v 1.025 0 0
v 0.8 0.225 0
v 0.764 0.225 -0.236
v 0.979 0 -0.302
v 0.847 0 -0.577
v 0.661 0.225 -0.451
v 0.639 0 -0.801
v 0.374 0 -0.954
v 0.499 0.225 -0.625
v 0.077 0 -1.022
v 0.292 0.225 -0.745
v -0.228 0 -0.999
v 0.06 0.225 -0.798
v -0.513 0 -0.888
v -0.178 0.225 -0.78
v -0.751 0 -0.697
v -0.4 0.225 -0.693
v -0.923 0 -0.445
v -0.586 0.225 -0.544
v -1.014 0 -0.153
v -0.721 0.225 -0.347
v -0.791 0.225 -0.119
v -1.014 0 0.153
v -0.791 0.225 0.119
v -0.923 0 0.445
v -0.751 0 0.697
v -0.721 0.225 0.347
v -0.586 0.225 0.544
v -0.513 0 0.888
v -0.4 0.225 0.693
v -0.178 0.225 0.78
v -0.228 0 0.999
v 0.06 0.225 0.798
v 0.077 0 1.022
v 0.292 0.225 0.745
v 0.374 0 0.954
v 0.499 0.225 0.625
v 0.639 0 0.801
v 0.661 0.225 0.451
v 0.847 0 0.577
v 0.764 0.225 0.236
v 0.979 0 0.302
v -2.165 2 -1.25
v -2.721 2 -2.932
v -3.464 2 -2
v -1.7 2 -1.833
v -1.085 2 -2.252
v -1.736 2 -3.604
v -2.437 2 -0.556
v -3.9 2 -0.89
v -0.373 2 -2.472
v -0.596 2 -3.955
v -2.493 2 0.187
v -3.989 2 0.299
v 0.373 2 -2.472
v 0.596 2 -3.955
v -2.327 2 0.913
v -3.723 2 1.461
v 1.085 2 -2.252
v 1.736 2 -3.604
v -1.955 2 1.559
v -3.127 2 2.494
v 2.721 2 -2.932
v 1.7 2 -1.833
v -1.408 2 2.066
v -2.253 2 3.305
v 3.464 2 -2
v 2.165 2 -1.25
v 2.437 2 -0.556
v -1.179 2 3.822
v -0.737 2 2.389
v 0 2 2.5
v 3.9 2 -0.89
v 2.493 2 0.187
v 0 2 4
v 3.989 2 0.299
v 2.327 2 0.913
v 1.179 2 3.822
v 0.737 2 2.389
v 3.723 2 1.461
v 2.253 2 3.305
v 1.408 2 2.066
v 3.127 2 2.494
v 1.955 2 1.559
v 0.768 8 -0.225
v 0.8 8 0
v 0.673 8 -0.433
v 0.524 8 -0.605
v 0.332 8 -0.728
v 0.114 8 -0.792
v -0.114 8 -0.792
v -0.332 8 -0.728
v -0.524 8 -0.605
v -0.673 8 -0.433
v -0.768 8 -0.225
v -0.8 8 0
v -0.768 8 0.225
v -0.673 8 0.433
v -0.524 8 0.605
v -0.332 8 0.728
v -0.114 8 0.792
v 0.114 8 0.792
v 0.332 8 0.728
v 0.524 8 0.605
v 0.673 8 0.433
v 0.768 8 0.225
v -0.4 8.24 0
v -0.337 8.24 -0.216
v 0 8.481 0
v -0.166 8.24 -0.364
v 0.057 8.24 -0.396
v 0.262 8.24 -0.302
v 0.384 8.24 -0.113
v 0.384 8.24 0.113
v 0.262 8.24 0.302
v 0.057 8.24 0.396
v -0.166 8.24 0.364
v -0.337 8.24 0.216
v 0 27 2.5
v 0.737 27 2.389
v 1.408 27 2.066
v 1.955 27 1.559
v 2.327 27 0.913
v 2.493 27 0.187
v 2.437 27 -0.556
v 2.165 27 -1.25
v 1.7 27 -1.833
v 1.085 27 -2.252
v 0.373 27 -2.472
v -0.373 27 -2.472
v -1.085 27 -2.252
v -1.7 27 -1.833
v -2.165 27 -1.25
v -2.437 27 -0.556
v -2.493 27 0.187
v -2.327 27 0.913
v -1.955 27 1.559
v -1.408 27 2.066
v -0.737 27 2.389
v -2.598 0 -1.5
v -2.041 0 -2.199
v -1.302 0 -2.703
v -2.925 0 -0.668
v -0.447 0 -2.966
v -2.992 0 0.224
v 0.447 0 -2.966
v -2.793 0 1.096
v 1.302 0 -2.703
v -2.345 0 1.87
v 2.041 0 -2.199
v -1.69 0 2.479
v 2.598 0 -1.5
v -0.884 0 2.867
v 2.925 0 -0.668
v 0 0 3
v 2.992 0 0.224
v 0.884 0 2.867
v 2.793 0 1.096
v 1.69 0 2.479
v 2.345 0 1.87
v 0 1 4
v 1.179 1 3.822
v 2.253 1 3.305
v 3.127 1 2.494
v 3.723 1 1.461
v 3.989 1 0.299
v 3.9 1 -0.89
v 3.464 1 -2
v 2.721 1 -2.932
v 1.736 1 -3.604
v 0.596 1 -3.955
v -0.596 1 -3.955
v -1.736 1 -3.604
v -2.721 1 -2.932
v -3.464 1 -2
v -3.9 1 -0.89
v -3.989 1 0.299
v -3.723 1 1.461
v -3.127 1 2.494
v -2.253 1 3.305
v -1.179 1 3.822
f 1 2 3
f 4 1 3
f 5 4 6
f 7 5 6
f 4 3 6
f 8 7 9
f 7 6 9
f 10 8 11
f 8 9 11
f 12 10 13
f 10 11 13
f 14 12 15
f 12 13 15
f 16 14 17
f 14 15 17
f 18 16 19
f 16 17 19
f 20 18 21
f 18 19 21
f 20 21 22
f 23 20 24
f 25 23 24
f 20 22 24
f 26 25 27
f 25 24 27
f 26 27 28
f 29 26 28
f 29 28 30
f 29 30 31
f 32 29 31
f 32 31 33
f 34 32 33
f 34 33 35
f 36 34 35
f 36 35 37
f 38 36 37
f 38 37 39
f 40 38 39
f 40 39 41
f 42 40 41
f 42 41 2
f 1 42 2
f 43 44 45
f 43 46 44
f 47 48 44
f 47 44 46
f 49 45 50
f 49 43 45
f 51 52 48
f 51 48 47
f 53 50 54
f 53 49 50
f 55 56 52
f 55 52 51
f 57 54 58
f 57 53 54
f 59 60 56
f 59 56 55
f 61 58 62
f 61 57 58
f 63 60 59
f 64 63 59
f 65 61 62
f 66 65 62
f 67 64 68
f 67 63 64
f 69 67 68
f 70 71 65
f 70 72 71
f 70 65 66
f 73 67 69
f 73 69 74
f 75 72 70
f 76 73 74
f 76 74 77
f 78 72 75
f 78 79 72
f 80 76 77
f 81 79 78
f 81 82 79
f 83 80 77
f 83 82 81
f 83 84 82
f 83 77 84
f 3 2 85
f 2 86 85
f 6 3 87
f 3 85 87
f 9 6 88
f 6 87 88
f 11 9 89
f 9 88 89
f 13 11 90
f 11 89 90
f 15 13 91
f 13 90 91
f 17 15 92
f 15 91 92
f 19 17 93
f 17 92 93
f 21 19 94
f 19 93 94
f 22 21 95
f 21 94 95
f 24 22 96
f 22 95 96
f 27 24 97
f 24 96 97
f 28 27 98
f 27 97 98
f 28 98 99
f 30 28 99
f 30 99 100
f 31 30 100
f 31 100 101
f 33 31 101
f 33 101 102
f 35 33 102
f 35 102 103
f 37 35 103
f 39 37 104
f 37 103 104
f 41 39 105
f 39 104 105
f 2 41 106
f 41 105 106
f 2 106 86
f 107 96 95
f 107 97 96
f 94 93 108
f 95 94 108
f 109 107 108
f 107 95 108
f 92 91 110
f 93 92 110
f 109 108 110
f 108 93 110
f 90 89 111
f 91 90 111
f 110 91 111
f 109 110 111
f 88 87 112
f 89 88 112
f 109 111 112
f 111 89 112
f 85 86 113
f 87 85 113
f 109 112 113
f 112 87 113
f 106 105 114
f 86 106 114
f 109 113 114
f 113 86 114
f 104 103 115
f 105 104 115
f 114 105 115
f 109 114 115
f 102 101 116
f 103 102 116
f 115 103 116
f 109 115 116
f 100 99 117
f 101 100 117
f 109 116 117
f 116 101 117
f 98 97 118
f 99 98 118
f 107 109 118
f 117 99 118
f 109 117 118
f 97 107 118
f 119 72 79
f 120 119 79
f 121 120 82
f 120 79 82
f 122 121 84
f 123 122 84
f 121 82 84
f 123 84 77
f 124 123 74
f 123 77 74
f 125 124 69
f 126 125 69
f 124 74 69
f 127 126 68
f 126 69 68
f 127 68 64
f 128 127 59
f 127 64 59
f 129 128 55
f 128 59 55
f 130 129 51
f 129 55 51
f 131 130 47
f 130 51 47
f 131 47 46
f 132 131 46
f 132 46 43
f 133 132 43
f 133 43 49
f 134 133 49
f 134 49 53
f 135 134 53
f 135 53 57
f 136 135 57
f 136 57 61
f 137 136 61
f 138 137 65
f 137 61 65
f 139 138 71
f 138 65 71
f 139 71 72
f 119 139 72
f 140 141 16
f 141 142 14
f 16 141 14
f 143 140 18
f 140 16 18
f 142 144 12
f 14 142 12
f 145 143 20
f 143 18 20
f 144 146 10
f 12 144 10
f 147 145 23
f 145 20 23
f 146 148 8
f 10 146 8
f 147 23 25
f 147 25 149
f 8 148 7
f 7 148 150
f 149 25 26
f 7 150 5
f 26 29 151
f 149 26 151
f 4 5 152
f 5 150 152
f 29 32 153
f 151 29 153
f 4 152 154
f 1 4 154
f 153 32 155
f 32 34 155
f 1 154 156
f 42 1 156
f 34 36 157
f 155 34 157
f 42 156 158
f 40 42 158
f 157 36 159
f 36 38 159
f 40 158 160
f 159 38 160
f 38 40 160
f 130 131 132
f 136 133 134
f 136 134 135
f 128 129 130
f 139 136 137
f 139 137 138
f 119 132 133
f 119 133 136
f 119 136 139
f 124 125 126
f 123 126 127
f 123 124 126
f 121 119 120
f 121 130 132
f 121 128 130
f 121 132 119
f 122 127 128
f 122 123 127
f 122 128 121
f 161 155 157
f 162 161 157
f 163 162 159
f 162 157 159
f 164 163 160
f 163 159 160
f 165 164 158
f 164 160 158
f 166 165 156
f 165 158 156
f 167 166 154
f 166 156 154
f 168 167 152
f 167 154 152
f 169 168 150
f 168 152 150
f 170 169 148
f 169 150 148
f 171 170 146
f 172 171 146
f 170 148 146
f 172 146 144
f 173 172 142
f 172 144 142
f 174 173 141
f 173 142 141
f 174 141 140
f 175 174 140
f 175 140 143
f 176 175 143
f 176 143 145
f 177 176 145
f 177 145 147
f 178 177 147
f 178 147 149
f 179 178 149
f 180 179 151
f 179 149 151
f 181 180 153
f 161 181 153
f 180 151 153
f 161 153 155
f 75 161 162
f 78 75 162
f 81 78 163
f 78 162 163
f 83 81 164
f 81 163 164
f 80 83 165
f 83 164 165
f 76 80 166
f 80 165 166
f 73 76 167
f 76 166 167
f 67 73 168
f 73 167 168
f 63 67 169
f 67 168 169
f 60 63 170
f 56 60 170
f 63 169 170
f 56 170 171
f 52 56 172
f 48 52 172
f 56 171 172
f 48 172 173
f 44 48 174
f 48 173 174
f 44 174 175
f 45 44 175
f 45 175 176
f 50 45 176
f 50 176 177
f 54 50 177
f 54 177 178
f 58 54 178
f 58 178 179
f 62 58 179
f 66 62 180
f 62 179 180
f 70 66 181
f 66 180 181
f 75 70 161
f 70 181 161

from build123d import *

# Parameters (mm, degrees)
SKETCH1_R                   = 4
BOSS_EXTRUDE1_DEPTH         = 2
SKETCH2_R                   = 2.5
BOSS_EXTRUDE2_DEPTH         = 25
M2_TAPPED_HOLE1_D           = 1.6
M2_TAPPED_HOLE1_DEPTH       = 8
M2_TAPPED_HOLE1_CSINK_D     = 2.05
M2_TAPPED_HOLE1_CSINK_ANGLE = 90
M2_TAPPED_HOLE1_TIP         = 0.480688495
CHAMFER1_SIZE               = 1


with BuildPart() as part:
    # Sketch1 → Boss-Extrude1 (new body)
    with BuildSketch(Plane(origin=(0, 0, 0), x_dir=(1, 0, 0), z_dir=(0, 1, 0))):
        with Locations(Location((0, 0, 0), (0, 0, 270))):
            Circle(SKETCH1_R)
    extrude(amount=BOSS_EXTRUDE1_DEPTH)

    # Sketch2 → Boss-Extrude2 (add)
    with BuildSketch(Plane(origin=(0, 2, 0), x_dir=(1, 0, 0), z_dir=(0, 1, 0))):
        with Locations(Location((0, 0, 0), (0, 0, 270))):
            Circle(SKETCH2_R)
    extrude(amount=BOSS_EXTRUDE2_DEPTH)

    # M2 Tapped Hole1
    with Locations(Plane(origin=(0, 0, 0), x_dir=(-1, 0, 0), z_dir=(0, -1, 0))):
        with Locations((0, 0)):
            CounterSinkHole(M2_TAPPED_HOLE1_D / 2, M2_TAPPED_HOLE1_CSINK_D / 2, depth=M2_TAPPED_HOLE1_DEPTH, counter_sink_angle=M2_TAPPED_HOLE1_CSINK_ANGLE)
            with Locations((0, 0, -(M2_TAPPED_HOLE1_DEPTH + M2_TAPPED_HOLE1_TIP / 2))):  # 118° drill point
                Cone(0, M2_TAPPED_HOLE1_D / 2, M2_TAPPED_HOLE1_TIP, mode=Mode.SUBTRACT)

    # Chamfer1
    chamfer1_edges = [part.edges().sort_by_distance(p)[0] for p in [
        (0, 0, -4),
    ]]
    chamfer(chamfer1_edges, length=CHAMFER1_SIZE)


solid = part.part
